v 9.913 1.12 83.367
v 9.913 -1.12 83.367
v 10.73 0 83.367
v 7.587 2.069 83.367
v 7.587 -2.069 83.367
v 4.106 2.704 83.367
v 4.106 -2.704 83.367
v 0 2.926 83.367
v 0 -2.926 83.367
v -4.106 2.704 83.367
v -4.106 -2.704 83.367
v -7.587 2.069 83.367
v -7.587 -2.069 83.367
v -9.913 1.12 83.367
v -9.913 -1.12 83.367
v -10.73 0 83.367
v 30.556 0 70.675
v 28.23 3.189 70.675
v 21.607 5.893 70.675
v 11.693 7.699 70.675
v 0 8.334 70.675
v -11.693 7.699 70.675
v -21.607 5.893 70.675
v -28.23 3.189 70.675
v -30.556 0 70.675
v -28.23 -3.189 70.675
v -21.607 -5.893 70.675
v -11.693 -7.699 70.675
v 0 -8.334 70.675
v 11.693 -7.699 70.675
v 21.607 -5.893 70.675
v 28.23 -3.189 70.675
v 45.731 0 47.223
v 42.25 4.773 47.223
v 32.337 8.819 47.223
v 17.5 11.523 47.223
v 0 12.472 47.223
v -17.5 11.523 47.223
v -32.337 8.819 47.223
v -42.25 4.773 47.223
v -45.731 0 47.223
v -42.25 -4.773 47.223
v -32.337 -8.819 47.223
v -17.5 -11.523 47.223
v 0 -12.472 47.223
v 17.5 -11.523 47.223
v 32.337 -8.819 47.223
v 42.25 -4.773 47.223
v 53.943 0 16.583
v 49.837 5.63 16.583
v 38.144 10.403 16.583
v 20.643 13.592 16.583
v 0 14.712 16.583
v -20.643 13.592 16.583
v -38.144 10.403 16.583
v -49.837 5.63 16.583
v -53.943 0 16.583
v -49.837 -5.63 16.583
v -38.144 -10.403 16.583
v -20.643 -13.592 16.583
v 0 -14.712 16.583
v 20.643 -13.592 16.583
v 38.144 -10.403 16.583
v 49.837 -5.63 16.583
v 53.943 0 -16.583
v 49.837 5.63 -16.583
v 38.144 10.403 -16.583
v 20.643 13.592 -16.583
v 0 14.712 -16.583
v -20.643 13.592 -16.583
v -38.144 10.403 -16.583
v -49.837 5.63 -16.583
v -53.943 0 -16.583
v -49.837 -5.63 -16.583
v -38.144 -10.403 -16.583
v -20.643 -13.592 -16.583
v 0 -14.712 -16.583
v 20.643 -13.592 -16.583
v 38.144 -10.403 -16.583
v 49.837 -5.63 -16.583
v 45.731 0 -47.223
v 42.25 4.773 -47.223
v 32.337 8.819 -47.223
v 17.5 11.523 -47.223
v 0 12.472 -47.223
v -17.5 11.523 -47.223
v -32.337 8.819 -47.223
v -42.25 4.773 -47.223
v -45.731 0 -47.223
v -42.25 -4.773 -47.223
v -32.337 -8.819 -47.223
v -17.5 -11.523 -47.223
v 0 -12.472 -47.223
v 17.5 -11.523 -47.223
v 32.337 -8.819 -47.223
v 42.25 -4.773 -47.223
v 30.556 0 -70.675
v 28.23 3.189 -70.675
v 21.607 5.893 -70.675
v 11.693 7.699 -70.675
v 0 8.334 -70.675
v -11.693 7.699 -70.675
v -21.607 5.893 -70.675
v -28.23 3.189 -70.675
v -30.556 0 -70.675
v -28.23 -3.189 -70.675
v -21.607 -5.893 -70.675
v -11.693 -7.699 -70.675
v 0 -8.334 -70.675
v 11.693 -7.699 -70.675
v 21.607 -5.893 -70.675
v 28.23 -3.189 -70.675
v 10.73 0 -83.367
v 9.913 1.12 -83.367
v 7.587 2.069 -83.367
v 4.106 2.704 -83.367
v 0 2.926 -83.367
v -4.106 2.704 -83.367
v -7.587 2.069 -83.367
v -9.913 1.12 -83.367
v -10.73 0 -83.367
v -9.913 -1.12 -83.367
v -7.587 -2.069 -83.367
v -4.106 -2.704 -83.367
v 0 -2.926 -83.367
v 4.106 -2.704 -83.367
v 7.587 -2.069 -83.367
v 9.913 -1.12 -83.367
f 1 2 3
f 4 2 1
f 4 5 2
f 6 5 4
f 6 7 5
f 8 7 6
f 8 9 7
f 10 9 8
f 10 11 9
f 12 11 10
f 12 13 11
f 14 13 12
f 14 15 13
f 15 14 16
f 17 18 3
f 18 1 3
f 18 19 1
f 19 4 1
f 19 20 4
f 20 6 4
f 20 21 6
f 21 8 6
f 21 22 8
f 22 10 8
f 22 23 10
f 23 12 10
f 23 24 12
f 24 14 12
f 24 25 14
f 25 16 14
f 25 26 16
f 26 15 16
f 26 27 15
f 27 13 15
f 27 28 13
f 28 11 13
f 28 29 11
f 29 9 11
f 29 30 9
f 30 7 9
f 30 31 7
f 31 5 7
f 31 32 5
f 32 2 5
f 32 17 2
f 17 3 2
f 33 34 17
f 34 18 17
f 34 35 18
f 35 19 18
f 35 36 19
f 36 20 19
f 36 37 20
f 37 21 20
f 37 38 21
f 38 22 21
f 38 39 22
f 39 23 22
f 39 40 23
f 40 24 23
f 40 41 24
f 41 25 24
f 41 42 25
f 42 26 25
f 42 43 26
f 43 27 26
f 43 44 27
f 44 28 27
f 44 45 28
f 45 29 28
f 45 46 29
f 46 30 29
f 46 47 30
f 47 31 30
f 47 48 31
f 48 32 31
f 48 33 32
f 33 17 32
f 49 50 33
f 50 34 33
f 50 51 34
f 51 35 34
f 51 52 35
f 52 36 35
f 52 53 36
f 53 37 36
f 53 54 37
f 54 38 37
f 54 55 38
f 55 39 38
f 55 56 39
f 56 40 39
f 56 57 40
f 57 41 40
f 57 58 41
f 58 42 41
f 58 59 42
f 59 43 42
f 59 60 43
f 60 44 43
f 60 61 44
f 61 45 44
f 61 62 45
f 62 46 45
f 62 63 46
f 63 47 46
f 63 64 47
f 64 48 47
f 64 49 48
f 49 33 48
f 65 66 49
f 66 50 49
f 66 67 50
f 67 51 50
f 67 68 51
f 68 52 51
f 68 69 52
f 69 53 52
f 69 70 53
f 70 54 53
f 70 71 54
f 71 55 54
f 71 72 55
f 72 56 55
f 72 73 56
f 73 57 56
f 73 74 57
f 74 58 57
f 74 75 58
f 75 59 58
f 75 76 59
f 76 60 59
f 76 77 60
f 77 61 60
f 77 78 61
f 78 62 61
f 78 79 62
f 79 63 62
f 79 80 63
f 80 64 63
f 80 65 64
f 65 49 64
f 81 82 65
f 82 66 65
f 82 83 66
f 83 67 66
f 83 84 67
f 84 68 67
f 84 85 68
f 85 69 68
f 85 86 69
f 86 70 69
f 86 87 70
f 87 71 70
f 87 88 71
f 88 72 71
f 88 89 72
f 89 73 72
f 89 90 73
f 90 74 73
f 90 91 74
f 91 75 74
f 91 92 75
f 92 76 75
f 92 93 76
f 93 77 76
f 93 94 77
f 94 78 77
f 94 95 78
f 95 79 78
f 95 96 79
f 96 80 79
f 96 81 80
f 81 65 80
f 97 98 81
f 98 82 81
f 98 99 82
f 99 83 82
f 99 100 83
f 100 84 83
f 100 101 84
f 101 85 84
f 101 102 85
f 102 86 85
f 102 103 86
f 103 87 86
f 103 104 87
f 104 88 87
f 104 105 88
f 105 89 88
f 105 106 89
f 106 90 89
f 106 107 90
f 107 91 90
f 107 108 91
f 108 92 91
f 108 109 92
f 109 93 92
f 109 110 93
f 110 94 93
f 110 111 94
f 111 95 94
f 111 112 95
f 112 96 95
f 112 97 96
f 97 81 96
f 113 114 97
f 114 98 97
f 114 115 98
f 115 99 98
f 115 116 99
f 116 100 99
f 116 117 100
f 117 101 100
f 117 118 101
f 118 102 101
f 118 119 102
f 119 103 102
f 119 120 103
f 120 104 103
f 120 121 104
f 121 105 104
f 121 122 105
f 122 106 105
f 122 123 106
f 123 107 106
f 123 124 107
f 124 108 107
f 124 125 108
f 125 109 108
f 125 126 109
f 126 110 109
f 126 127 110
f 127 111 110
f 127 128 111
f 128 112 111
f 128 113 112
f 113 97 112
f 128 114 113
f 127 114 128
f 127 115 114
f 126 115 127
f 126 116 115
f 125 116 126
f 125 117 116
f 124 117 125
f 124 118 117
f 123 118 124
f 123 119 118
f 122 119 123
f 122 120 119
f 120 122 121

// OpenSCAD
// Generated by SolidPython 1.0.1 on 2020-07-29 00:46:49


scale(v = [11, 3, 17]) {
	sphere(r = 5);
}
/***********************************************
*********      SolidPython code:      **********
************************************************
 
# import packages: SolidPython
from solid import *
from solid.utils import *
from itertools import chain, combinations, permutations


class Resize:

    def __init__(self, scad_file):
        self.scad_file = scad_file
        #self.scad_file = import_scad(scad_file)
        # cone/cylinder param:
        self.r1 = 0
        self.r2 = 0
        self.h = 0
        # rectangular prism param:
        self.w = 0
        self.l = 0
        # ellipse param:
        self.r = 0

    # import OpenScad code (file name corresponds to shape)


    # classify shape + parameters
    def assign(self, param1, param2, param3):
        if self.scad_file == 'cone.scad':
            self.r1 = param1
            self.r2 = param2
            self.h = param3
        elif self.scad_file == 'cylinder.scad':
            self.r1 = param1
            self.r2 = param2
            self.h = param3
        elif self.scad_file == 'rectangularPrism.scad':
            self.h = param1
            self.l = param2
            self.w = param3
        else:
            self.r = param1
            self.h = param2

    # resize parameters
    def iterate(self):
        x = range(3, 20, 2)
        i = 1
        if self.scad_file == 'cone.scad':
            tempList = list(permutations(x, 2))
            for temp in tempList:
                param1 = temp[0]
                param2 = temp[1]
                filepath = 'produced_scad_files/' + 'cone' + str(param1) + '_' + str(param2) + '_' + '.scad'
                scad_render_to_file(cylinder(h=param1, r1=param2, r2=0), filepath)

        elif self.scad_file == 'cylinder.scad':
            tempList = list(permutations(x, 3))
            for temp in tempList:
                param1 = temp[0]
                param2 = temp[1]
                filepath = 'produced_scad_files/' + 'cylinder' + str(param1) + '_' + str(param2) + '_' + '.scad'
                scad_render_to_file(cylinder(h=param1, r1=param2, r2=param2), filepath)

        elif self.scad_file == 'rectangularPrism.scad':
            tempList = list(permutations(x, 3))
            for temp in tempList:
                param1 = temp[0]
                param2 = temp[1]
                param3 = temp[2]
                filepath = 'produced_scad_files/' + 'rectangularPrism' + str(param1) + '_' + str(param2) + '_' + str(
                    param3) + '.scad'
                scad_render_to_file(cube(size=(param1, param2, param3)), filepath)

        elif self.scad_file == 'ellipse.scad':
            tempList = list(permutations(x, 4))
            for temp in tempList:
                param1 = temp[0]
                param2 = temp[1]
                param3 = temp[2]
                param4 = temp[3]
                filepath = 'produced_scad_files/' + 'ellipse' + str(param1) + '_' + str(param2) + '_' + str(param3) + '_' + str(param4) + '.scad'
                scad_render_to_file(scale([param1, param2, param3])(sphere(r=param4)), filepath)

    def render_to_scadfile(self):
        scad_render_to_file(scad, 'example.scad') 
 
************************************************/
